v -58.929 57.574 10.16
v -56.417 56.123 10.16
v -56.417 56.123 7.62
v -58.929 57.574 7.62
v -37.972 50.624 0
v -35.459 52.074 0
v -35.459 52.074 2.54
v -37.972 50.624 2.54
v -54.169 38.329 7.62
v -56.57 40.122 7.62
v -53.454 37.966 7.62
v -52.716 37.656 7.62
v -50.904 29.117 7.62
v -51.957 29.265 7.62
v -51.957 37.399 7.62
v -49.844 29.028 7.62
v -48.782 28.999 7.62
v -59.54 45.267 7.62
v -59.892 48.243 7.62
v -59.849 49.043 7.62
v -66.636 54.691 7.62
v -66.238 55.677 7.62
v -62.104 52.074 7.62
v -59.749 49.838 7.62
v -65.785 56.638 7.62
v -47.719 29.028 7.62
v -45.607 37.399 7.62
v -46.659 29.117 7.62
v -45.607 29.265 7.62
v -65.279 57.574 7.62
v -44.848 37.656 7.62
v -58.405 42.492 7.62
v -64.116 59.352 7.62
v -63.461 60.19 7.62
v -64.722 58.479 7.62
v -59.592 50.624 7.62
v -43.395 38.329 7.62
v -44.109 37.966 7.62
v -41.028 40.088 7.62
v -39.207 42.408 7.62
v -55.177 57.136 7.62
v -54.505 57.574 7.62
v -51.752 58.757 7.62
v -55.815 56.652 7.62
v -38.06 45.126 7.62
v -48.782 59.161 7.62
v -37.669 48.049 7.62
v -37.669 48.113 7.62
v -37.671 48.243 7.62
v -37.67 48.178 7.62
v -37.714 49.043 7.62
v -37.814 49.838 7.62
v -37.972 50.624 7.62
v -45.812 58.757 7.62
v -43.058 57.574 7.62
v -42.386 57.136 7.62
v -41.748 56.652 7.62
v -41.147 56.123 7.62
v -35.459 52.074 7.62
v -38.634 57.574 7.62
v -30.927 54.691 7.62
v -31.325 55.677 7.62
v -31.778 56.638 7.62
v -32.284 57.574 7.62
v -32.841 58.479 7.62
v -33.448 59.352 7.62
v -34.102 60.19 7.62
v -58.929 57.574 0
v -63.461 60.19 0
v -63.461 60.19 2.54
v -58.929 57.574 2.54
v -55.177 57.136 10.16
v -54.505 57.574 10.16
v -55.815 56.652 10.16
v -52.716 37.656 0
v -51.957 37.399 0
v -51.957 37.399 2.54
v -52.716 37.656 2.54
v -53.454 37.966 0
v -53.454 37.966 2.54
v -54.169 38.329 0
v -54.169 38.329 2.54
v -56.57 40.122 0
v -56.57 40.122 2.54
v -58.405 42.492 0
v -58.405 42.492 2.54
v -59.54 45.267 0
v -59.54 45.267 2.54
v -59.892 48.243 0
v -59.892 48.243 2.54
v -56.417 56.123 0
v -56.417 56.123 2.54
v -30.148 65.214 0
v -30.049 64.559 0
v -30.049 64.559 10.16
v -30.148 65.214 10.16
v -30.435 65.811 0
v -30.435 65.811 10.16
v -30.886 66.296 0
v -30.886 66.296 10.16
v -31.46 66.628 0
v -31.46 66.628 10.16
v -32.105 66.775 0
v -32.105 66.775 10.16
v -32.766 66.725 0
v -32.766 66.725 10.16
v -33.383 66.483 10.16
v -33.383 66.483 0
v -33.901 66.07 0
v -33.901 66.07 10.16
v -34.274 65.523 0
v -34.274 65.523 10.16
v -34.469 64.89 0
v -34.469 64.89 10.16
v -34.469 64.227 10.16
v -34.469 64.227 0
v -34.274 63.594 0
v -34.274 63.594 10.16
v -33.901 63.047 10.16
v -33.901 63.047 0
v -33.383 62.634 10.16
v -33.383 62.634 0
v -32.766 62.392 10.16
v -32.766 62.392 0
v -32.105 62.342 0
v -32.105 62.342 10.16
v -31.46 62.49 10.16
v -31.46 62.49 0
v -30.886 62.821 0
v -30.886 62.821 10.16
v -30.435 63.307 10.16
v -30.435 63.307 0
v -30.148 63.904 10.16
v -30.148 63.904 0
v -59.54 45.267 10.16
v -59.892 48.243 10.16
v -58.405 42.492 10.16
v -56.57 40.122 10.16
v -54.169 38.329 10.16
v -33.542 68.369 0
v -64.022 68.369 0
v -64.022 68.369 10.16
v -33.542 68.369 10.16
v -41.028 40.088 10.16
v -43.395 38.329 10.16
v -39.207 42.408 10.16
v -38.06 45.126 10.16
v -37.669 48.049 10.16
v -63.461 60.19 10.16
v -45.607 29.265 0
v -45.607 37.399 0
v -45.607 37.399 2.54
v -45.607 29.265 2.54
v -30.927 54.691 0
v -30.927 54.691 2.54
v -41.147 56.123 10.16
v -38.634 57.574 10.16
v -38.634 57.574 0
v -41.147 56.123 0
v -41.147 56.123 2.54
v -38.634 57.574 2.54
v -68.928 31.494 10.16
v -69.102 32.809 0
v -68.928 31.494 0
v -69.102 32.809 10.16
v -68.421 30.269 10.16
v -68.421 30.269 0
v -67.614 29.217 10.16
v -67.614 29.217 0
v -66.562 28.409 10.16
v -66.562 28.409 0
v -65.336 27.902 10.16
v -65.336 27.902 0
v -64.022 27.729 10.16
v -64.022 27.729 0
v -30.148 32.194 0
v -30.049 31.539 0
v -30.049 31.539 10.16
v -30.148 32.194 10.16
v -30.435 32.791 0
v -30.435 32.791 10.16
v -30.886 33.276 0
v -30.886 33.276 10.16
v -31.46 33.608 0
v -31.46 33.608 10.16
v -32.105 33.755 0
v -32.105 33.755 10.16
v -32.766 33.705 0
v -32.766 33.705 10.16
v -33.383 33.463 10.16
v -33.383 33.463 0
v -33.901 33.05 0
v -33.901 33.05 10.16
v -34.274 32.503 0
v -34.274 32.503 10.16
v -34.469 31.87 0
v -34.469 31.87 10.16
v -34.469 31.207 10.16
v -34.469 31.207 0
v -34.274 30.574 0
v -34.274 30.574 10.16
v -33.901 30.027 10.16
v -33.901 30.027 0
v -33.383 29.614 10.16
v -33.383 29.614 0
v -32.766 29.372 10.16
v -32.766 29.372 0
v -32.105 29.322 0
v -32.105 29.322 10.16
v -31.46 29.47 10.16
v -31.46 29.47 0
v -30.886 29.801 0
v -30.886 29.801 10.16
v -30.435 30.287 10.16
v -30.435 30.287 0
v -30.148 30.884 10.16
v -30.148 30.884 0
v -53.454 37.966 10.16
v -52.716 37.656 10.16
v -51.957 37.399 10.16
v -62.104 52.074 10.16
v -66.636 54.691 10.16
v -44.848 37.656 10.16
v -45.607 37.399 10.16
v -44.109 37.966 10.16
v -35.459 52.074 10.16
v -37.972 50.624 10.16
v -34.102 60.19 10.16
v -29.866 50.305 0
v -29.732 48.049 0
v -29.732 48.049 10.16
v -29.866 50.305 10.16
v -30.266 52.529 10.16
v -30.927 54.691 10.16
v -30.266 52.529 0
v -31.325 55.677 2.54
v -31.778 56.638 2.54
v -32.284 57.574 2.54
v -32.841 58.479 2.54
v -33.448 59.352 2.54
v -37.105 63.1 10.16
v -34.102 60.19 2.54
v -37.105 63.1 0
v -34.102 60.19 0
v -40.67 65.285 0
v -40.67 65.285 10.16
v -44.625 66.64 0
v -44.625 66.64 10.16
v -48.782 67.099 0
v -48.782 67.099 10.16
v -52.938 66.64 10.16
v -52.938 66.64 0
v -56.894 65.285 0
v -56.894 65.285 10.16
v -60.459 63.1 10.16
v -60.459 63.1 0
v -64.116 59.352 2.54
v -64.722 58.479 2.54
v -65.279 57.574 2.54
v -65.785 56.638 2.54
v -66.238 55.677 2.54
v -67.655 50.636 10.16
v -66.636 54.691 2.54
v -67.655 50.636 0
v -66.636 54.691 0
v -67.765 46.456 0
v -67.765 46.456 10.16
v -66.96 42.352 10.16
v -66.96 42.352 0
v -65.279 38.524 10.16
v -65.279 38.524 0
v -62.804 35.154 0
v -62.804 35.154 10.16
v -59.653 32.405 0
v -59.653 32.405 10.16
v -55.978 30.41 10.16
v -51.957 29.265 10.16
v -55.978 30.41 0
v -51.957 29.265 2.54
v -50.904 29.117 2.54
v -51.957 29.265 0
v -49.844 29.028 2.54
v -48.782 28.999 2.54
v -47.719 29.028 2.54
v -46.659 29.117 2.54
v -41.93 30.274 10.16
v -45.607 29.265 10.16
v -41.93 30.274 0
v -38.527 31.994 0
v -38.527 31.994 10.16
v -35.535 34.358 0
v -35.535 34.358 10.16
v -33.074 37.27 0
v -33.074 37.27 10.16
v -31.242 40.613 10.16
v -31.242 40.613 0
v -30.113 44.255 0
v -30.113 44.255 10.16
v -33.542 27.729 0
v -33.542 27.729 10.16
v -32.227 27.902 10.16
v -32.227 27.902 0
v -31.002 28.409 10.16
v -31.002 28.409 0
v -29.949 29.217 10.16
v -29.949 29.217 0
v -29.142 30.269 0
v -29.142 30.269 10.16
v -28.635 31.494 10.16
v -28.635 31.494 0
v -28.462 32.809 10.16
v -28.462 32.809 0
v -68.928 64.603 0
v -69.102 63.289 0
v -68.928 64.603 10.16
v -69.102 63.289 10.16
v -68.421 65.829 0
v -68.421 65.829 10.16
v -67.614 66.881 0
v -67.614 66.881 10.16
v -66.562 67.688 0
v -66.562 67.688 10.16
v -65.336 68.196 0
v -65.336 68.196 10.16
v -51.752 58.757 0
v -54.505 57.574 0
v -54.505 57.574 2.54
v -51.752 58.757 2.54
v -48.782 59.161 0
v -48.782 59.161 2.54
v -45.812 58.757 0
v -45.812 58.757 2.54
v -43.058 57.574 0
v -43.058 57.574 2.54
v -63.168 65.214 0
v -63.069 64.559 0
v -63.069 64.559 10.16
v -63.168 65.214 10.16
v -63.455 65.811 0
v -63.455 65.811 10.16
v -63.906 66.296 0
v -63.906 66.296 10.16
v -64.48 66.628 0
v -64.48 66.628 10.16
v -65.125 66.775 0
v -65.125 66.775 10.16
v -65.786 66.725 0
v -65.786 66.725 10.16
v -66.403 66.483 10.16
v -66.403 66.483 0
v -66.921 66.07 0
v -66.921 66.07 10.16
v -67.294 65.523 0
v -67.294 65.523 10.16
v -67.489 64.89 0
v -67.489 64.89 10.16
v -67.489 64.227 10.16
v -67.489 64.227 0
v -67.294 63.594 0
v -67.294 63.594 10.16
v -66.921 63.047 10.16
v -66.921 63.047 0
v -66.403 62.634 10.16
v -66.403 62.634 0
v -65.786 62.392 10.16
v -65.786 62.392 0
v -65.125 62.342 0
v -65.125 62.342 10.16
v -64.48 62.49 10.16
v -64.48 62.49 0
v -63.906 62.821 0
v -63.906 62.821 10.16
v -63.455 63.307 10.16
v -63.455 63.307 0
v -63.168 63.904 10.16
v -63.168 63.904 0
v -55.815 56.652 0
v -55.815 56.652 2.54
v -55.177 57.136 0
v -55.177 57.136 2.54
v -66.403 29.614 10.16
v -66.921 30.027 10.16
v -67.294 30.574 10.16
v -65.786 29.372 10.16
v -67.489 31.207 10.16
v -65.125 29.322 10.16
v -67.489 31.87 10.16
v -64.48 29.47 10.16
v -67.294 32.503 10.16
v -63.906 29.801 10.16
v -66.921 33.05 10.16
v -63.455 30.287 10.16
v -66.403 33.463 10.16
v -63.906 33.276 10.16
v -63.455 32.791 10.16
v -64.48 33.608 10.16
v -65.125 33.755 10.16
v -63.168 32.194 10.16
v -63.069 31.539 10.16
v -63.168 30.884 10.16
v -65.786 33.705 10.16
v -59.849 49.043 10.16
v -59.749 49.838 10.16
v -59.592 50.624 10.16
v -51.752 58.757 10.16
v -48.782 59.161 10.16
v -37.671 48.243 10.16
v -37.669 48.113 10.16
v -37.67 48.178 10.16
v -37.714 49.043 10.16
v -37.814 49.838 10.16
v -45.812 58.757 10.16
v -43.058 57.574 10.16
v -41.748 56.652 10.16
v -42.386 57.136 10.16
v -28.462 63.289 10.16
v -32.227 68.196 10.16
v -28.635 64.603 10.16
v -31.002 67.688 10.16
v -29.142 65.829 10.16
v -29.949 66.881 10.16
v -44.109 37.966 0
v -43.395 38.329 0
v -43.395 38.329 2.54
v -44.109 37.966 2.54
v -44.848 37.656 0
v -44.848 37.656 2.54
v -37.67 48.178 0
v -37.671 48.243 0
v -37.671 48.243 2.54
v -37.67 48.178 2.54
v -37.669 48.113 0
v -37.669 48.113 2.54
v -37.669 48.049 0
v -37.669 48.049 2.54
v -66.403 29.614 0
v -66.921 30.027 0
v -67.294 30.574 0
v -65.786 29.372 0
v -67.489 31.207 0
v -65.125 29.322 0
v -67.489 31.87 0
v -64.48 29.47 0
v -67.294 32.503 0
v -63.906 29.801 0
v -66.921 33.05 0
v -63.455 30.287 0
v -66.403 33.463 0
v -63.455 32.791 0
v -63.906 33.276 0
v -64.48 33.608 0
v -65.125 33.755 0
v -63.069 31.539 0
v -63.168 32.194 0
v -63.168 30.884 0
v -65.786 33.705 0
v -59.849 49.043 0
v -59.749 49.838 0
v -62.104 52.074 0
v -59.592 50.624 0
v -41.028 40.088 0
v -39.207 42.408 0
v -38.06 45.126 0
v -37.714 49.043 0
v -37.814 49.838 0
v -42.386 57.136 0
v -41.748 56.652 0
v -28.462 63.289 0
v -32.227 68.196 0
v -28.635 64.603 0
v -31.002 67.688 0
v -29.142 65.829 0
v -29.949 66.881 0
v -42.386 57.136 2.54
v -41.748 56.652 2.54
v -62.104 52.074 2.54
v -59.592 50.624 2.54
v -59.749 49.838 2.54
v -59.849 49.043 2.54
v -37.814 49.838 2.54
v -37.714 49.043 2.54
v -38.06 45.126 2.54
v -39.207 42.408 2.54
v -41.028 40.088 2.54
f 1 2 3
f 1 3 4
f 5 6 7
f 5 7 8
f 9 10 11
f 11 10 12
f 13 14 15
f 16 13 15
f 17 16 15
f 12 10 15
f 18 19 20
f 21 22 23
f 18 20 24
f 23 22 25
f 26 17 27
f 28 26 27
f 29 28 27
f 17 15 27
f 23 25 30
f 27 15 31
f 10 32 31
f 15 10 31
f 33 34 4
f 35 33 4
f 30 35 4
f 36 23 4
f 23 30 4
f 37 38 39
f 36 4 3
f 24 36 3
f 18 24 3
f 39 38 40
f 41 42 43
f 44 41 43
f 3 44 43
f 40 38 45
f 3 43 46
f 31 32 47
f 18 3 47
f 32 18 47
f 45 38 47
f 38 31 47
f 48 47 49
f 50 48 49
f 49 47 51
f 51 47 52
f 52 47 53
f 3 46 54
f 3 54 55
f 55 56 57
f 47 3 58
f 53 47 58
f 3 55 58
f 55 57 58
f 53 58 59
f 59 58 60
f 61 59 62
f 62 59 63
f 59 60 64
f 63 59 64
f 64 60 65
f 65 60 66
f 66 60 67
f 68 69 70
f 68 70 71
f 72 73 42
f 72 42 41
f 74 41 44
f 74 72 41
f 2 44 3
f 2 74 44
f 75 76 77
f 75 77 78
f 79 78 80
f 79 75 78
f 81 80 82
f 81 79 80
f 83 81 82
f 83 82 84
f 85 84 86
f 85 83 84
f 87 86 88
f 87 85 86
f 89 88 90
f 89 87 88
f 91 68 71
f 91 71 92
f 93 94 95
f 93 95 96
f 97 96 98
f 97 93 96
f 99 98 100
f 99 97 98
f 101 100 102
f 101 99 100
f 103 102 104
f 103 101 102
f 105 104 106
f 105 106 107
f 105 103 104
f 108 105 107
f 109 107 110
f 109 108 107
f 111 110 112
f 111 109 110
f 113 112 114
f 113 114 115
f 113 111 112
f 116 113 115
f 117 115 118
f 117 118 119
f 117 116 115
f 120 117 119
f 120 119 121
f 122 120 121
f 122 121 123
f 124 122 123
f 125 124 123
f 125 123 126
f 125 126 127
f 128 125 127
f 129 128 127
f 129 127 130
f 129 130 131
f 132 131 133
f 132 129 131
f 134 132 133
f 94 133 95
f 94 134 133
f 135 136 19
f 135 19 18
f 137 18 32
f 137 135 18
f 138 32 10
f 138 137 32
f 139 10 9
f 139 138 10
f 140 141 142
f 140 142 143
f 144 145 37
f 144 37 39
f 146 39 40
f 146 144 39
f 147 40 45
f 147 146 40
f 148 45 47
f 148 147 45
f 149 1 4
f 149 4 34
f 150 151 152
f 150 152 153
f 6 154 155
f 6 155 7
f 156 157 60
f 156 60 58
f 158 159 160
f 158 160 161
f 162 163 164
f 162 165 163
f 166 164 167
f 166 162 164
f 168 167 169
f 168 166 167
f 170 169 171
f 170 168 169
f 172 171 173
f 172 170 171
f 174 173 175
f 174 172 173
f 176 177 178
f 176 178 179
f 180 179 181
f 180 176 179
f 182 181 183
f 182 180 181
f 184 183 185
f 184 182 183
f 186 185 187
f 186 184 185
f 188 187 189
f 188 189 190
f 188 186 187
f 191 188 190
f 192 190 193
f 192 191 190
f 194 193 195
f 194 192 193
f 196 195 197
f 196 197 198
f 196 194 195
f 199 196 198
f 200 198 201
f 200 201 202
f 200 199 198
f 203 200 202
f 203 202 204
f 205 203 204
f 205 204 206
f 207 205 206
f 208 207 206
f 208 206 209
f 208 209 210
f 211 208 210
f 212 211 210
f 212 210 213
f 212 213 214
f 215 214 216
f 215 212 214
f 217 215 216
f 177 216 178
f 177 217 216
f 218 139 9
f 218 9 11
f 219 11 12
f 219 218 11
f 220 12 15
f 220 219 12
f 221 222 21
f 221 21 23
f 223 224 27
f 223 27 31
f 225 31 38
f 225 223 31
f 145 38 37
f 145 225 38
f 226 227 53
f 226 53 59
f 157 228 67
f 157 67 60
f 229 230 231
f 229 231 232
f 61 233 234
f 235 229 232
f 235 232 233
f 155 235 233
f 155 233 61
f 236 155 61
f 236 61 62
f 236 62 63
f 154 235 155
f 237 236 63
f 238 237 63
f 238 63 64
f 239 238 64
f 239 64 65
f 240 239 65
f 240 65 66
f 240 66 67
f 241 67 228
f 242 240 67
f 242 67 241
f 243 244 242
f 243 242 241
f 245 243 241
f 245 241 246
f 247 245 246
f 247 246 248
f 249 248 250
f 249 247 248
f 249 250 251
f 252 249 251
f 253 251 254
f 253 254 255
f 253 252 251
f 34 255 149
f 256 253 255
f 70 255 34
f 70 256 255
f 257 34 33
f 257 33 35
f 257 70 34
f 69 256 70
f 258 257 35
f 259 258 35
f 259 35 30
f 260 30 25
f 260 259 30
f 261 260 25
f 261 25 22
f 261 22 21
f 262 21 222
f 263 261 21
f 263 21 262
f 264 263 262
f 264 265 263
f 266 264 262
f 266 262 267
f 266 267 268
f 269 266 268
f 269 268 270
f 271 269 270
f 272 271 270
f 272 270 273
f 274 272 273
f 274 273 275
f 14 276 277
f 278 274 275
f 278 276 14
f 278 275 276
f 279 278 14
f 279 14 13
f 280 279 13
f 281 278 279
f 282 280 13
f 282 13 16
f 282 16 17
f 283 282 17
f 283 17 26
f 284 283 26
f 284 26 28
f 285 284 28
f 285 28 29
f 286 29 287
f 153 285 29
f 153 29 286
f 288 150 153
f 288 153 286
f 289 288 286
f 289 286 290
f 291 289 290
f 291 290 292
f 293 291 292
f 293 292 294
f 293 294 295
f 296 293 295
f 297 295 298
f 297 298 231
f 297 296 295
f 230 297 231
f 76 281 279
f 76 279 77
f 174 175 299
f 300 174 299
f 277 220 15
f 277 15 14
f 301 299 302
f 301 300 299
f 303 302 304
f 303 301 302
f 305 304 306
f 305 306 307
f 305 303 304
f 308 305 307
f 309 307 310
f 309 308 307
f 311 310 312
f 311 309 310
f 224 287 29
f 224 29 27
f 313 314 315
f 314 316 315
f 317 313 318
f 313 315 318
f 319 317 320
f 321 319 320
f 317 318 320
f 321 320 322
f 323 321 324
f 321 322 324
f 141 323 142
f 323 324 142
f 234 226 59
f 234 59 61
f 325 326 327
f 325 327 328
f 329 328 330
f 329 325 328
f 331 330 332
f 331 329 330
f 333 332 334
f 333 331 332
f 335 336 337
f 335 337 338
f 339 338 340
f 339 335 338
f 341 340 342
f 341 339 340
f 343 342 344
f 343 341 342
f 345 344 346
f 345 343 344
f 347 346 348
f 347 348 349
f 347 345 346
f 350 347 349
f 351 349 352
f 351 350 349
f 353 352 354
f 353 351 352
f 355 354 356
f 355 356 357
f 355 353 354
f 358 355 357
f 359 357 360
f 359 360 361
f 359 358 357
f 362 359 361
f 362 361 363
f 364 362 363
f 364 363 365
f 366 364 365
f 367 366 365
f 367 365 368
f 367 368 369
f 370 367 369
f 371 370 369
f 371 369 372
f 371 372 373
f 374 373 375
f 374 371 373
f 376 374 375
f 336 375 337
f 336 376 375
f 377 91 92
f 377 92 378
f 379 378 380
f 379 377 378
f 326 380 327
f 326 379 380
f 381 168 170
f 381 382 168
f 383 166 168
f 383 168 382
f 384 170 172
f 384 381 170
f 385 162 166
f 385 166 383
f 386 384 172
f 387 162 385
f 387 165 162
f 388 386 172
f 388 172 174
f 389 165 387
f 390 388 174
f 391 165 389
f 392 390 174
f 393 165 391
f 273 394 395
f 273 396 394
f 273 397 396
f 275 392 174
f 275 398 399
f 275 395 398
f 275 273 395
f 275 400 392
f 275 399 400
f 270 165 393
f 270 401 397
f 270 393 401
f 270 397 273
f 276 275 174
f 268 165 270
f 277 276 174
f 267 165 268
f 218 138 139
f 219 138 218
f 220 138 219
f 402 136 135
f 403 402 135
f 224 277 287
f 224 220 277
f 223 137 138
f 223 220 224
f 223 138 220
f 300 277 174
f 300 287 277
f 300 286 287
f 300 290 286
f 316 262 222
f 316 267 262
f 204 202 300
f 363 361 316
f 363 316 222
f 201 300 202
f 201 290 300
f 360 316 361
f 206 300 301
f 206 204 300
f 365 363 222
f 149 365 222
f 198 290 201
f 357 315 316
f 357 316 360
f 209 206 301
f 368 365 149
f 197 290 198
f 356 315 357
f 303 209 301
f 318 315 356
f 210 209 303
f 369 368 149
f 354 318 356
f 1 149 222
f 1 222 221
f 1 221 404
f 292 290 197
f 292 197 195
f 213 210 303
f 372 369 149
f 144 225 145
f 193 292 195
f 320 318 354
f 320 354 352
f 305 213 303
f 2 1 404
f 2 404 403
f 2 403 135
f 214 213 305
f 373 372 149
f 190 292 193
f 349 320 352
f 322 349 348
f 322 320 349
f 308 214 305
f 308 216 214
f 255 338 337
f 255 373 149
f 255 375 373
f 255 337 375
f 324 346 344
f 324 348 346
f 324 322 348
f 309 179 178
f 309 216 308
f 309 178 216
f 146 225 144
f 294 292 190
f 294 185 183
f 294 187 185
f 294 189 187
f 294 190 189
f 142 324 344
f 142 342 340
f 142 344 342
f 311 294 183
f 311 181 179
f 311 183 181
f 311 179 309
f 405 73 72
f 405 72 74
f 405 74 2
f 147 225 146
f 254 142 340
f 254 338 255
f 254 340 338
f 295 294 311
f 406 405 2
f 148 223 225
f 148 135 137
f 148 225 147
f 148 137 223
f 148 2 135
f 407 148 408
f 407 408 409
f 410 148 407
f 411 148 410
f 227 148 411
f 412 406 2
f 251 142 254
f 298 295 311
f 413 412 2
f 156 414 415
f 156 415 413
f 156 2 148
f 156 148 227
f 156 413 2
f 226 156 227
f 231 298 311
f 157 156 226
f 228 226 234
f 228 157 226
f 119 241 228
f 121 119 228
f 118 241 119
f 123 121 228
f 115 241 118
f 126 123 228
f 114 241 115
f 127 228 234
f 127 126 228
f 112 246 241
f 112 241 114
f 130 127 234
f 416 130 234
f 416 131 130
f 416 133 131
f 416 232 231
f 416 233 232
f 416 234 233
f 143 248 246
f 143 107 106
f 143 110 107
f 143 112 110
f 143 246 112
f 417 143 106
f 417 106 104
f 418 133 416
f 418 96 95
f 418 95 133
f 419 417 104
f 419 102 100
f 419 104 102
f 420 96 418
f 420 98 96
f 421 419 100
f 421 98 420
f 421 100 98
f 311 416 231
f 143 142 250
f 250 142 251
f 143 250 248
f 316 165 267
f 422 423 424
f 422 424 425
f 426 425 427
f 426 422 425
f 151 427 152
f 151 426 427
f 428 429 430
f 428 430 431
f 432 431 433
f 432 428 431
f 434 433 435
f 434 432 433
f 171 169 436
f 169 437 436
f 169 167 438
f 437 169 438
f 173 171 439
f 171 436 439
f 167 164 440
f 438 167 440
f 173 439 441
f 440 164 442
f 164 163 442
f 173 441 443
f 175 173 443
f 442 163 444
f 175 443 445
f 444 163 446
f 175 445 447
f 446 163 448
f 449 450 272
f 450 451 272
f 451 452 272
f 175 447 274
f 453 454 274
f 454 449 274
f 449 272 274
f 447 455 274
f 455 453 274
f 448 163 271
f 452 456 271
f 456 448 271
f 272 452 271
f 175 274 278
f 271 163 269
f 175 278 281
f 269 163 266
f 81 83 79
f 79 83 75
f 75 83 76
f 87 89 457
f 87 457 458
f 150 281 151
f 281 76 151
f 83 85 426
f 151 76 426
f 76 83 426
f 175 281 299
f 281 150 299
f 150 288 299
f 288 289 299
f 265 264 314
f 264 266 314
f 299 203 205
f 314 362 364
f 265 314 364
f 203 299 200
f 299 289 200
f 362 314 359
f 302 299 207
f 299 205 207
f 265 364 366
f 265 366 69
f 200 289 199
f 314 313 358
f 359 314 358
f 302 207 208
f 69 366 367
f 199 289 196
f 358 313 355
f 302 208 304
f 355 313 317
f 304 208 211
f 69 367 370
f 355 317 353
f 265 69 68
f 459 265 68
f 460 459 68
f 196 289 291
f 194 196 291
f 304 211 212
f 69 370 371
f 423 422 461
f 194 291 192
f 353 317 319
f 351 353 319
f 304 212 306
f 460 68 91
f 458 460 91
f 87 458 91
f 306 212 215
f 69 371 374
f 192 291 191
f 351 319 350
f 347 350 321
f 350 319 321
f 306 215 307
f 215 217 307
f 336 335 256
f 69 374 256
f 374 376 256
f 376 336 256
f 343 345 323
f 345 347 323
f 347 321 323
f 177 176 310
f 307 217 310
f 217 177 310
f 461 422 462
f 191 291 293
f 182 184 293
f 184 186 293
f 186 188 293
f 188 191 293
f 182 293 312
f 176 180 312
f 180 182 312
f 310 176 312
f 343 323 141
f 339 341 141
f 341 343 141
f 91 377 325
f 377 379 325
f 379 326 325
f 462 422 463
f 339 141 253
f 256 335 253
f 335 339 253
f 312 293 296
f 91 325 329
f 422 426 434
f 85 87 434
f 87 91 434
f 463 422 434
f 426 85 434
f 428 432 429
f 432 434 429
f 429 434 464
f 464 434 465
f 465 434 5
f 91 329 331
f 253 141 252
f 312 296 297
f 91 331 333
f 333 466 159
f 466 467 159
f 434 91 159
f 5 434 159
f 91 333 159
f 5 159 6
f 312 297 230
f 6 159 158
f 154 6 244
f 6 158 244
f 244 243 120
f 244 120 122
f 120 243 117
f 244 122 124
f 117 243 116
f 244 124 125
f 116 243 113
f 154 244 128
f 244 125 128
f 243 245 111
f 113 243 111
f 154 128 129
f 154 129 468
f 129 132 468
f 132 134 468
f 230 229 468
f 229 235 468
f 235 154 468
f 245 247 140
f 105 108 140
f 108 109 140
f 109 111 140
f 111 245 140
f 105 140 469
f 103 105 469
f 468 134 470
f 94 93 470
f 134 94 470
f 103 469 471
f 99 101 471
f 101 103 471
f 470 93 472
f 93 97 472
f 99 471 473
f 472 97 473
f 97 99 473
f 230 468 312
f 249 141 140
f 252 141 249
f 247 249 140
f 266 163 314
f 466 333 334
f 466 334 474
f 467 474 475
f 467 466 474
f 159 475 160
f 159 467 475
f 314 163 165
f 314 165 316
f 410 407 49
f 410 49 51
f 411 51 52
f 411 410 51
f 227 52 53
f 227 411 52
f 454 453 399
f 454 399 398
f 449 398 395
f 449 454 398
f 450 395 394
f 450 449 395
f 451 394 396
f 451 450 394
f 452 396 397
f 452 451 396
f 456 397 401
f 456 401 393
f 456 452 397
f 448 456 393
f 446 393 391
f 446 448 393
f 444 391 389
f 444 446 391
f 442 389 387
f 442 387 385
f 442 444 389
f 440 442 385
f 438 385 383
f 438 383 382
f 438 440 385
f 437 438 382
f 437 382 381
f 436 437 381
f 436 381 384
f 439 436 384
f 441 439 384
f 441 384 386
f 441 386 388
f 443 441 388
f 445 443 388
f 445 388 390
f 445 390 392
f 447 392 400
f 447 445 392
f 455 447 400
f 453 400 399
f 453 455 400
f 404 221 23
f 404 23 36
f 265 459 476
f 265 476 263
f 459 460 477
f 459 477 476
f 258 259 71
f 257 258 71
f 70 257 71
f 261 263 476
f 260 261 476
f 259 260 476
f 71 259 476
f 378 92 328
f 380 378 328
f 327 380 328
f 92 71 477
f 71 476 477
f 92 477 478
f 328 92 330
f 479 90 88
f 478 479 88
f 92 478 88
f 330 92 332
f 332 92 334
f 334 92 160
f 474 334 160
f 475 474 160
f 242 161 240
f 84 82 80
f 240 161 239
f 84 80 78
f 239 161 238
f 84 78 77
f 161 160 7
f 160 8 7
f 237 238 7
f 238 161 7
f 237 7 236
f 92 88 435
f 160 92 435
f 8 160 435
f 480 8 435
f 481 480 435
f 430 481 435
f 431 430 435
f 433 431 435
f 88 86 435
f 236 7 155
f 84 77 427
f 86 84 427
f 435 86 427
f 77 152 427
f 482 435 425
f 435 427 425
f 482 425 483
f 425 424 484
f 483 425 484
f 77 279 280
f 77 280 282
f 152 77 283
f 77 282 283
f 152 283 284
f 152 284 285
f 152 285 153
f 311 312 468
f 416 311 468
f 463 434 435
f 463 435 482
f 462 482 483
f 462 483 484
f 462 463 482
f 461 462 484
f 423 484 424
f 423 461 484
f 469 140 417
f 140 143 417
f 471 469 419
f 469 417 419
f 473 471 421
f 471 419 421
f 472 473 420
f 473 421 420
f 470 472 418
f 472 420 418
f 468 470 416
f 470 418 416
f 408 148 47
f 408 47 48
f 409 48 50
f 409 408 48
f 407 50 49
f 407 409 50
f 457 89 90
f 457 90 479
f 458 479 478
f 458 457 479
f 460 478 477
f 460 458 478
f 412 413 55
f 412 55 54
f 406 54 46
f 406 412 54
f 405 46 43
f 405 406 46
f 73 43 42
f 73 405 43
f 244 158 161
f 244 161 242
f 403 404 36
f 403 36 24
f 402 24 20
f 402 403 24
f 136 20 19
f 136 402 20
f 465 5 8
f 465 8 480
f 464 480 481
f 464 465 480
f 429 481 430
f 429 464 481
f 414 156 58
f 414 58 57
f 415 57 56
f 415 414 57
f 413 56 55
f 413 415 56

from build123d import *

# Parameters (mm, degrees)
F0_W     = 40.64
F0_H     = 40.64
F0_R     = 2.2225
F0_R_2   = 19.05
F1_DEPTH = 10.16
F3_DEPTH = 2.54
F5_DEPTH = 2.54
F6_R     = 5.08
F7_R     = 5.08
F8_R     = 5.08
F9_R     = 5.08


with BuildPart() as f1:
    # F0 (on Top) → F1 (new body)
    with BuildSketch(Plane.XY):
        with Locations((-48.7815736455, 48.0486563069)):
            Rectangle(F0_W, F0_H)
        with Locations((-65.2915736455, 31.5386563069)):
            Circle(F0_R, mode=Mode.SUBTRACT)
        with Locations((-32.2715736455, 31.5386563069)):
            Circle(F0_R, mode=Mode.SUBTRACT)
        with Locations((-48.7815736455, 48.0486563069)):
            Circle(F0_R_2, mode=Mode.SUBTRACT)
        with Locations((-65.2915736455, 64.5586563069)):
            Circle(F0_R, mode=Mode.SUBTRACT)
        with Locations((-32.2715736455, 64.5586563069)):
            Circle(F0_R, mode=Mode.SUBTRACT)
    extrude(amount=F1_DEPTH)

    # F2 (on face) → F3 (join)
    with BuildSketch(Plane(origin=(0, 0, 0), x_dir=(1, 0, 0), z_dir=(0, 0, -1))):
        with BuildLine():
            Line((-65.2793575876, -57.5736563069), (-58.405280945, -53.6049063069))
            ThreePointArc((-58.405280945, -53.6049063069), (-59.1066149083, -52.157327524), (-59.5916152386, -50.6236625213))
            Line((-59.5916152386, -50.6236625213), (-62.1043575876, -52.0743949928))
            Line((-62.1043575876, -52.0743949928), (-65.2793575876, -57.5736563069))
        make_face()
        with BuildLine():
            ThreePointArc((-65.2793575876, -57.5736563069), (-64.4250288468, -58.9199400104), (-63.4611079864, -60.1900636195))
            Line((-63.4611079864, -60.1900636195), (-58.9293575876, -57.5736563069))
            Line((-58.9293575876, -57.5736563069), (-65.2793575876, -57.5736563069))
        make_face()
        with BuildLine():
            ThreePointArc((-56.4166152386, -56.1229238353), (-57.5023079267, -54.9360687271), (-58.405280945, -53.6049063069))
            Line((-58.405280945, -53.6049063069), (-65.2793575876, -57.5736563069))
            Line((-65.2793575876, -57.5736563069), (-58.9293575876, -57.5736563069))
            Line((-58.9293575876, -57.5736563069), (-56.4166152386, -56.1229238353))
        make_face()
        with BuildLine():
            Line((-62.1043575876, -52.0743949928), (-66.6361079864, -54.6908023055))
            ThreePointArc((-66.6361079864, -54.6908023055), (-66.0181091052, -56.1606440624), (-65.2793575876, -57.5736563069))
            Line((-65.2793575876, -57.5736563069), (-62.1043575876, -52.0743949928))
        make_face()
        with BuildLine():
            Line((-58.405280945, -53.6049063069), (-48.7815736455, -48.0486563069))
            Line((-48.7815736455, -48.0486563069), (-51.9565736455, -48.0486563069))
            Line((-51.9565736455, -48.0486563069), (-51.9565736455, -46.2155692022))
            Line((-51.9565736455, -46.2155692022), (-59.5916152386, -50.6236625213))
            ThreePointArc((-59.5916152386, -50.6236625213), (-59.1066149083, -52.157327524), (-58.405280945, -53.6049063069))
        make_face()
        with BuildLine():
            Line((-50.3690736455, -50.7982869639), (-48.7815736455, -48.0486563069))
            Line((-48.7815736455, -48.0486563069), (-58.405280945, -53.6049063069))
            ThreePointArc((-58.405280945, -53.6049063069), (-57.5023079267, -54.9360687271), (-56.4166152386, -56.1229238353))
            Line((-56.4166152386, -56.1229238353), (-48.7815736455, -51.7148305162))
            Line((-48.7815736455, -51.7148305162), (-50.3690736455, -50.7982869639))
        make_face()
        with BuildLine():
            ThreePointArc((-43.0577609957, -57.5736563069), (-42.0628756431, -56.9000264496), (-41.1465320523, -56.1229238353))
            Line((-41.1465320523, -56.1229238353), (-48.7815736455, -51.7148305162))
            Line((-48.7815736455, -51.7148305162), (-56.4166152386, -56.1229238353))
            ThreePointArc((-56.4166152386, -56.1229238353), (-55.5002716478, -56.9000264496), (-54.5053862953, -57.5736563069))
            Line((-54.5053862953, -57.5736563069), (-43.0577609957, -57.5736563069))
        make_face()
        with BuildLine():
            Line((-51.9565736455, -46.2155692022), (-51.9565736455, -37.399382564))
            ThreePointArc((-51.9565736455, -37.399382564), (-53.0877360462, -37.8044080851), (-54.1685592916, -38.3291891456))
            Line((-54.1685592916, -38.3291891456), (-59.8923719414, -48.2431234681))
            ThreePointArc((-59.8923719414, -48.2431234681), (-59.8064340485, -49.4415343859), (-59.5916152386, -50.6236625213))
            Line((-59.5916152386, -50.6236625213), (-51.9565736455, -46.2155692022))
        make_face()
        Polygon((-51.9565736455, -48.0486563069), (-48.7815736455, -48.0486563069), (-50.3690736455, -45.2990256498), (-51.9565736455, -46.2155692022), align=None)
        Polygon((-47.1940736455, -50.7982869639), (-48.7815736455, -48.0486563069), (-50.3690736455, -50.7982869639), (-48.7815736455, -51.7148305162), align=None)
        Polygon((-45.6065736455, -48.0486563069), (-45.6065736455, -46.2155692022), (-47.1940736455, -45.2990256498), (-48.7815736455, -48.0486563069), align=None)
        with BuildLine():
            Line((-45.6065736455, -46.2155692022), (-45.6065736455, -37.399382564))
            ThreePointArc((-45.6065736455, -37.399382564), (-47.1772666638, -37.0525726696), (-48.7815736455, -36.9361563069))
            Line((-48.7815736455, -36.9361563069), (-48.7815736455, -48.0486563069))
            Line((-48.7815736455, -48.0486563069), (-47.1940736455, -45.2990256498))
            Line((-47.1940736455, -45.2990256498), (-45.6065736455, -46.2155692022))
        make_face()
        with BuildLine():
            Line((-48.7815736455, -48.0486563069), (-48.7815736455, -36.9361563069))
            ThreePointArc((-48.7815736455, -36.9361563069), (-50.3858806271, -37.0525726696), (-51.9565736455, -37.399382564))
            Line((-51.9565736455, -37.399382564), (-51.9565736455, -46.2155692022))
            Line((-51.9565736455, -46.2155692022), (-50.3690736455, -45.2990256498))
            Line((-50.3690736455, -45.2990256498), (-48.7815736455, -48.0486563069))
        make_face()
        with BuildLine():
            Line((-59.8923719414, -48.2431234681), (-54.1685592916, -38.3291891456))
            ThreePointArc((-54.1685592916, -38.3291891456), (-58.405280945, -42.4924063069), (-59.8923719414, -48.2431234681))
        make_face()
        with BuildLine():
            ThreePointArc((-54.5053862953, -57.5736563069), (-48.7815736455, -59.1611563069), (-43.0577609957, -57.5736563069))
            Line((-43.0577609957, -57.5736563069), (-54.5053862953, -57.5736563069))
        make_face()
        with BuildLine():
            ThreePointArc((-41.1465320523, -56.1229238353), (-40.0608393642, -54.9360687271), (-39.1578663459, -53.6049063069))
            Line((-39.1578663459, -53.6049063069), (-48.7815736455, -48.0486563069))
            Line((-48.7815736455, -48.0486563069), (-47.1940736455, -50.7982869639))
            Line((-47.1940736455, -50.7982869639), (-48.7815736455, -51.7148305162))
            Line((-48.7815736455, -51.7148305162), (-41.1465320523, -56.1229238353))
        make_face()
        with BuildLine():
            ThreePointArc((-39.1578663459, -53.6049063069), (-38.4565323826, -52.157327524), (-37.9715320523, -50.6236625213))
            Line((-37.9715320523, -50.6236625213), (-45.6065736455, -46.2155692022))
            Line((-45.6065736455, -46.2155692022), (-45.6065736455, -48.0486563069))
            Line((-45.6065736455, -48.0486563069), (-48.7815736455, -48.0486563069))
            Line((-48.7815736455, -48.0486563069), (-39.1578663459, -53.6049063069))
        make_face()
        with BuildLine():
            Line((-32.2837897034, -57.5736563069), (-39.1578663459, -53.6049063069))
            ThreePointArc((-39.1578663459, -53.6049063069), (-40.0608393642, -54.9360687271), (-41.1465320523, -56.1229238353))
            Line((-41.1465320523, -56.1229238353), (-38.6337897034, -57.5736563069))
            Line((-38.6337897034, -57.5736563069), (-32.2837897034, -57.5736563069))
        make_face()
        with BuildLine():
            ThreePointArc((-34.1020393045, -60.1900636195), (-33.1381184441, -58.9199400104), (-32.2837897034, -57.5736563069))
            Line((-32.2837897034, -57.5736563069), (-38.6337897034, -57.5736563069))
            Line((-38.6337897034, -57.5736563069), (-34.1020393045, -60.1900636195))
        make_face()
        with BuildLine():
            Line((-30.9270393045, -54.6908023055), (-35.4587897034, -52.0743949928))
            Line((-35.4587897034, -52.0743949928), (-32.2837897034, -57.5736563069))
            ThreePointArc((-32.2837897034, -57.5736563069), (-31.5450381858, -56.1606440624), (-30.9270393045, -54.6908023055))
        make_face()
        with BuildLine():
            Line((-35.4587897034, -52.0743949928), (-37.9715320523, -50.6236625213))
            ThreePointArc((-37.9715320523, -50.6236625213), (-38.4565323826, -52.157327524), (-39.1578663459, -53.6049063069))
            Line((-39.1578663459, -53.6049063069), (-32.2837897034, -57.5736563069))
            Line((-32.2837897034, -57.5736563069), (-35.4587897034, -52.0743949928))
        make_face()
        with BuildLine():
            Line((-37.6707753495, -48.2431234681), (-43.3945879993, -38.3291891456))
            ThreePointArc((-43.3945879993, -38.3291891456), (-44.4754112448, -37.8044080851), (-45.6065736455, -37.399382564))
            Line((-45.6065736455, -37.399382564), (-45.6065736455, -46.2155692022))
            Line((-45.6065736455, -46.2155692022), (-37.9715320523, -50.6236625213))
            ThreePointArc((-37.9715320523, -50.6236625213), (-37.7567132424, -49.4415343859), (-37.6707753495, -48.2431234681))
        make_face()
        with BuildLine():
            ThreePointArc((-37.6707753495, -48.2431234681), (-37.6694990796, -48.1458936101), (-37.6690736455, -48.0486563069))
            ThreePointArc((-37.6690736455, -48.0486563069), (-39.2068534343, -42.4084090491), (-43.3945879993, -38.3291891456))
            Line((-43.3945879993, -38.3291891456), (-37.6707753495, -48.2431234681))
        make_face()
        with BuildLine():
            ThreePointArc((-51.9565736455, -37.399382564), (-50.3858806271, -37.0525726696), (-48.7815736455, -36.9361563069))
            Line((-48.7815736455, -36.9361563069), (-48.7815736455, -28.9986563069))
            Line((-48.7815736455, -28.9986563069), (-51.9565736455, -34.4979176209))
            Line((-51.9565736455, -34.4979176209), (-51.9565736455, -37.399382564))
        make_face()
        with BuildLine():
            Line((-51.9565736455, -34.4979176209), (-48.7815736455, -28.9986563069))
            ThreePointArc((-48.7815736455, -28.9986563069), (-50.3746539038, -29.0653848477), (-51.9565736455, -29.2651029955))
            Line((-51.9565736455, -29.2651029955), (-51.9565736455, -34.4979176209))
        make_face()
        with BuildLine():
            ThreePointArc((-48.7815736455, -36.9361563069), (-47.1772666638, -37.0525726696), (-45.6065736455, -37.399382564))
            Line((-45.6065736455, -37.399382564), (-45.6065736455, -34.4979176209))
            Line((-45.6065736455, -34.4979176209), (-48.7815736455, -28.9986563069))
            Line((-48.7815736455, -28.9986563069), (-48.7815736455, -36.9361563069))
        make_face()
        with BuildLine():
            Line((-48.7815736455, -28.9986563069), (-45.6065736455, -34.4979176209))
            Line((-45.6065736455, -34.4979176209), (-45.6065736455, -29.2651029955))
            ThreePointArc((-45.6065736455, -29.2651029955), (-47.1884933871, -29.0653848477), (-48.7815736455, -28.9986563069))
        make_face()
    extrude(amount=-F3_DEPTH)

    # F4 (on face) → F5 (join)
    with BuildSketch(Plane.XY.offset(10.16)):
        with BuildLine():
            ThreePointArc((-65.2793575876, 57.5736563069), (-66.0181091052, 56.1606440624), (-66.6361079864, 54.6908023055))
            Line((-66.6361079864, 54.6908023055), (-62.1043575876, 52.0743949928))
            Line((-62.1043575876, 52.0743949928), (-65.2793575876, 57.5736563069))
        make_face()
        with BuildLine():
            ThreePointArc((-59.5916152386, 50.6236625213), (-59.1066149083, 52.157327524), (-58.405280945, 53.6049063069))
            Line((-58.405280945, 53.6049063069), (-65.2793575876, 57.5736563069))
            Line((-65.2793575876, 57.5736563069), (-62.1043575876, 52.0743949928))
            Line((-62.1043575876, 52.0743949928), (-59.5916152386, 50.6236625213))
        make_face()
        with BuildLine():
            Line((-65.2793575876, 57.5736563069), (-58.405280945, 53.6049063069))
            ThreePointArc((-58.405280945, 53.6049063069), (-57.5023079267, 54.9360687271), (-56.4166152386, 56.1229238353))
            Line((-56.4166152386, 56.1229238353), (-58.9293575876, 57.5736563069))
            Line((-58.9293575876, 57.5736563069), (-65.2793575876, 57.5736563069))
        make_face()
        with BuildLine():
            Line((-58.9293575876, 57.5736563069), (-63.4611079864, 60.1900636195))
            ThreePointArc((-63.4611079864, 60.1900636195), (-64.4250288468, 58.9199400104), (-65.2793575876, 57.5736563069))
            Line((-65.2793575876, 57.5736563069), (-58.9293575876, 57.5736563069))
        make_face()
        with BuildLine():
            Line((-48.7815736455, 51.7148305162), (-41.1465320523, 56.1229238353))
            ThreePointArc((-41.1465320523, 56.1229238353), (-42.0628756431, 56.9000264496), (-43.0577609957, 57.5736563069))
            Line((-43.0577609957, 57.5736563069), (-54.5053862953, 57.5736563069))
            ThreePointArc((-54.5053862953, 57.5736563069), (-55.5002716478, 56.9000264496), (-56.4166152386, 56.1229238353))
            Line((-56.4166152386, 56.1229238353), (-48.7815736455, 51.7148305162))
        make_face()
        with BuildLine():
            Line((-54.5053862953, 57.5736563069), (-43.0577609957, 57.5736563069))
            ThreePointArc((-43.0577609957, 57.5736563069), (-48.7815736455, 59.1611563069), (-54.5053862953, 57.5736563069))
        make_face()
        with BuildLine():
            Line((-58.405280945, 53.6049063069), (-48.7815736455, 48.0486563069))
            Line((-48.7815736455, 48.0486563069), (-50.3690736455, 50.7982869639))
            Line((-50.3690736455, 50.7982869639), (-48.7815736455, 51.7148305162))
            Line((-48.7815736455, 51.7148305162), (-56.4166152386, 56.1229238353))
            ThreePointArc((-56.4166152386, 56.1229238353), (-57.5023079267, 54.9360687271), (-58.405280945, 53.6049063069))
        make_face()
        with BuildLine():
            Line((-51.9565736455, 48.0486563069), (-48.7815736455, 48.0486563069))
            Line((-48.7815736455, 48.0486563069), (-58.405280945, 53.6049063069))
            ThreePointArc((-58.405280945, 53.6049063069), (-59.1066149083, 52.157327524), (-59.5916152386, 50.6236625213))
            Line((-59.5916152386, 50.6236625213), (-51.9565736455, 46.2155692022))
            Line((-51.9565736455, 46.2155692022), (-51.9565736455, 48.0486563069))
        make_face()
        with BuildLine():
            ThreePointArc((-59.8923719414, 48.2431234681), (-58.405280945, 42.4924063069), (-54.1685592916, 38.3291891456))
            Line((-54.1685592916, 38.3291891456), (-59.8923719414, 48.2431234681))
        make_face()
        with BuildLine():
            ThreePointArc((-54.1685592916, 38.3291891456), (-53.0877360462, 37.8044080851), (-51.9565736455, 37.399382564))
            Line((-51.9565736455, 37.399382564), (-51.9565736455, 46.2155692022))
            Line((-51.9565736455, 46.2155692022), (-59.5916152386, 50.6236625213))
            ThreePointArc((-59.5916152386, 50.6236625213), (-59.8064340485, 49.4415343859), (-59.8923719414, 48.2431234681))
            Line((-59.8923719414, 48.2431234681), (-54.1685592916, 38.3291891456))
        make_face()
        with BuildLine():
            ThreePointArc((-51.9565736455, 37.399382564), (-50.3858806271, 37.0525726696), (-48.7815736455, 36.9361563069))
            Line((-48.7815736455, 36.9361563069), (-48.7815736455, 48.0486563069))
            Line((-48.7815736455, 48.0486563069), (-50.3690736455, 45.2990256498))
            Line((-50.3690736455, 45.2990256498), (-51.9565736455, 46.2155692022))
            Line((-51.9565736455, 46.2155692022), (-51.9565736455, 37.399382564))
        make_face()
        with BuildLine():
            ThreePointArc((-48.7815736455, 36.9361563069), (-47.1772666638, 37.0525726696), (-45.6065736455, 37.399382564))
            Line((-45.6065736455, 37.399382564), (-45.6065736455, 46.2155692022))
            Line((-45.6065736455, 46.2155692022), (-47.1940736455, 45.2990256498))
            Line((-47.1940736455, 45.2990256498), (-48.7815736455, 48.0486563069))
            Line((-48.7815736455, 48.0486563069), (-48.7815736455, 36.9361563069))
        make_face()
        Polygon((-50.3690736455, 45.2990256498), (-48.7815736455, 48.0486563069), (-51.9565736455, 48.0486563069), (-51.9565736455, 46.2155692022), align=None)
        with BuildLine():
            Line((-48.7815736455, 48.0486563069), (-39.1578663459, 53.6049063069))
            ThreePointArc((-39.1578663459, 53.6049063069), (-40.0608393642, 54.9360687271), (-41.1465320523, 56.1229238353))
            Line((-41.1465320523, 56.1229238353), (-48.7815736455, 51.7148305162))
            Line((-48.7815736455, 51.7148305162), (-47.1940736455, 50.7982869639))
            Line((-47.1940736455, 50.7982869639), (-48.7815736455, 48.0486563069))
        make_face()
        with BuildLine():
            Line((-45.6065736455, 46.2155692022), (-37.9715320523, 50.6236625213))
            ThreePointArc((-37.9715320523, 50.6236625213), (-38.4565323826, 52.157327524), (-39.1578663459, 53.6049063069))
            Line((-39.1578663459, 53.6049063069), (-48.7815736455, 48.0486563069))
            Line((-48.7815736455, 48.0486563069), (-45.6065736455, 48.0486563069))
            Line((-45.6065736455, 48.0486563069), (-45.6065736455, 46.2155692022))
        make_face()
        Polygon((-47.1940736455, 45.2990256498), (-45.6065736455, 46.2155692022), (-45.6065736455, 48.0486563069), (-48.7815736455, 48.0486563069), align=None)
        Polygon((-50.3690736455, 50.7982869639), (-48.7815736455, 48.0486563069), (-47.1940736455, 50.7982869639), (-48.7815736455, 51.7148305162), align=None)
        with BuildLine():
            Line((-38.6337897034, 57.5736563069), (-32.2837897034, 57.5736563069))
            ThreePointArc((-32.2837897034, 57.5736563069), (-33.1381184441, 58.9199400104), (-34.1020393045, 60.1900636195))
            Line((-34.1020393045, 60.1900636195), (-38.6337897034, 57.5736563069))
        make_face()
        with BuildLine():
            ThreePointArc((-41.1465320523, 56.1229238353), (-40.0608393642, 54.9360687271), (-39.1578663459, 53.6049063069))
            Line((-39.1578663459, 53.6049063069), (-32.2837897034, 57.5736563069))
            Line((-32.2837897034, 57.5736563069), (-38.6337897034, 57.5736563069))
            Line((-38.6337897034, 57.5736563069), (-41.1465320523, 56.1229238353))
        make_face()
        with BuildLine():
            ThreePointArc((-39.1578663459, 53.6049063069), (-38.4565323826, 52.157327524), (-37.9715320523, 50.6236625213))
            Line((-37.9715320523, 50.6236625213), (-35.4587897034, 52.0743949928))
            Line((-35.4587897034, 52.0743949928), (-32.2837897034, 57.5736563069))
            Line((-32.2837897034, 57.5736563069), (-39.1578663459, 53.6049063069))
        make_face()
        with BuildLine():
            Line((-32.2837897034, 57.5736563069), (-35.4587897034, 52.0743949928))
            Line((-35.4587897034, 52.0743949928), (-30.9270393045, 54.6908023055))
            ThreePointArc((-30.9270393045, 54.6908023055), (-31.5450381858, 56.1606440624), (-32.2837897034, 57.5736563069))
        make_face()
        with BuildLine():
            Line((-43.3945879993, 38.3291891456), (-37.6707753495, 48.2431234681))
            ThreePointArc((-37.6707753495, 48.2431234681), (-37.7567132424, 49.4415343859), (-37.9715320523, 50.6236625213))
            Line((-37.9715320523, 50.6236625213), (-45.6065736455, 46.2155692022))
            Line((-45.6065736455, 46.2155692022), (-45.6065736455, 37.399382564))
            ThreePointArc((-45.6065736455, 37.399382564), (-44.4754112448, 37.8044080851), (-43.3945879993, 38.3291891456))
        make_face()
        with BuildLine():
            ThreePointArc((-43.3945879993, 38.3291891456), (-39.2068534343, 42.4084090491), (-37.6690736455, 48.0486563069))
            ThreePointArc((-37.6690736455, 48.0486563069), (-37.6694990796, 48.1458936101), (-37.6707753495, 48.2431234681))
            Line((-37.6707753495, 48.2431234681), (-43.3945879993, 38.3291891456))
        make_face()
        with BuildLine():
            Line((-45.6065736455, 34.4979176209), (-45.6065736455, 37.399382564))
            ThreePointArc((-45.6065736455, 37.399382564), (-47.1772666638, 37.0525726696), (-48.7815736455, 36.9361563069))
            Line((-48.7815736455, 36.9361563069), (-48.7815736455, 28.9986563069))
            Line((-48.7815736455, 28.9986563069), (-45.6065736455, 34.4979176209))
        make_face()
        with BuildLine():
            Line((-48.7815736455, 28.9986563069), (-48.7815736455, 36.9361563069))
            ThreePointArc((-48.7815736455, 36.9361563069), (-50.3858806271, 37.0525726696), (-51.9565736455, 37.399382564))
            Line((-51.9565736455, 37.399382564), (-51.9565736455, 34.4979176209))
            Line((-51.9565736455, 34.4979176209), (-48.7815736455, 28.9986563069))
        make_face()
        with BuildLine():
            ThreePointArc((-51.9565736455, 29.2651029955), (-50.3746539038, 29.0653848477), (-48.7815736455, 28.9986563069))
            Line((-48.7815736455, 28.9986563069), (-51.9565736455, 34.4979176209))
            Line((-51.9565736455, 34.4979176209), (-51.9565736455, 29.2651029955))
        make_face()
        with BuildLine():
            Line((-45.6065736455, 29.2651029955), (-45.6065736455, 34.4979176209))
            Line((-45.6065736455, 34.4979176209), (-48.7815736455, 28.9986563069))
            ThreePointArc((-48.7815736455, 28.9986563069), (-47.1884933871, 29.0653848477), (-45.6065736455, 29.2651029955))
        make_face()
    extrude(amount=-F5_DEPTH)

    # F6
    f6_edges = [f1.edges().sort_by_distance(p)[0] for p in [
        (-69.101574, 68.368656, 5.08),
    ]]
    fillet(f6_edges, radius=F6_R)

    # F7
    f7_edges = [f1.edges().sort_by_distance(p)[0] for p in [
        (-28.461574, 68.368656, 5.08),
    ]]
    fillet(f7_edges, radius=F7_R)

    # F8
    f8_edges = [f1.edges().sort_by_distance(p)[0] for p in [
        (-69.101574, 27.728656, 5.08),
    ]]
    fillet(f8_edges, radius=F8_R)

    # F9
    f9_edges = [f1.edges().sort_by_distance(p)[0] for p in [
        (-28.461574, 27.728656, 5.08),
    ]]
    fillet(f9_edges, radius=F9_R)


solid = f1.part
